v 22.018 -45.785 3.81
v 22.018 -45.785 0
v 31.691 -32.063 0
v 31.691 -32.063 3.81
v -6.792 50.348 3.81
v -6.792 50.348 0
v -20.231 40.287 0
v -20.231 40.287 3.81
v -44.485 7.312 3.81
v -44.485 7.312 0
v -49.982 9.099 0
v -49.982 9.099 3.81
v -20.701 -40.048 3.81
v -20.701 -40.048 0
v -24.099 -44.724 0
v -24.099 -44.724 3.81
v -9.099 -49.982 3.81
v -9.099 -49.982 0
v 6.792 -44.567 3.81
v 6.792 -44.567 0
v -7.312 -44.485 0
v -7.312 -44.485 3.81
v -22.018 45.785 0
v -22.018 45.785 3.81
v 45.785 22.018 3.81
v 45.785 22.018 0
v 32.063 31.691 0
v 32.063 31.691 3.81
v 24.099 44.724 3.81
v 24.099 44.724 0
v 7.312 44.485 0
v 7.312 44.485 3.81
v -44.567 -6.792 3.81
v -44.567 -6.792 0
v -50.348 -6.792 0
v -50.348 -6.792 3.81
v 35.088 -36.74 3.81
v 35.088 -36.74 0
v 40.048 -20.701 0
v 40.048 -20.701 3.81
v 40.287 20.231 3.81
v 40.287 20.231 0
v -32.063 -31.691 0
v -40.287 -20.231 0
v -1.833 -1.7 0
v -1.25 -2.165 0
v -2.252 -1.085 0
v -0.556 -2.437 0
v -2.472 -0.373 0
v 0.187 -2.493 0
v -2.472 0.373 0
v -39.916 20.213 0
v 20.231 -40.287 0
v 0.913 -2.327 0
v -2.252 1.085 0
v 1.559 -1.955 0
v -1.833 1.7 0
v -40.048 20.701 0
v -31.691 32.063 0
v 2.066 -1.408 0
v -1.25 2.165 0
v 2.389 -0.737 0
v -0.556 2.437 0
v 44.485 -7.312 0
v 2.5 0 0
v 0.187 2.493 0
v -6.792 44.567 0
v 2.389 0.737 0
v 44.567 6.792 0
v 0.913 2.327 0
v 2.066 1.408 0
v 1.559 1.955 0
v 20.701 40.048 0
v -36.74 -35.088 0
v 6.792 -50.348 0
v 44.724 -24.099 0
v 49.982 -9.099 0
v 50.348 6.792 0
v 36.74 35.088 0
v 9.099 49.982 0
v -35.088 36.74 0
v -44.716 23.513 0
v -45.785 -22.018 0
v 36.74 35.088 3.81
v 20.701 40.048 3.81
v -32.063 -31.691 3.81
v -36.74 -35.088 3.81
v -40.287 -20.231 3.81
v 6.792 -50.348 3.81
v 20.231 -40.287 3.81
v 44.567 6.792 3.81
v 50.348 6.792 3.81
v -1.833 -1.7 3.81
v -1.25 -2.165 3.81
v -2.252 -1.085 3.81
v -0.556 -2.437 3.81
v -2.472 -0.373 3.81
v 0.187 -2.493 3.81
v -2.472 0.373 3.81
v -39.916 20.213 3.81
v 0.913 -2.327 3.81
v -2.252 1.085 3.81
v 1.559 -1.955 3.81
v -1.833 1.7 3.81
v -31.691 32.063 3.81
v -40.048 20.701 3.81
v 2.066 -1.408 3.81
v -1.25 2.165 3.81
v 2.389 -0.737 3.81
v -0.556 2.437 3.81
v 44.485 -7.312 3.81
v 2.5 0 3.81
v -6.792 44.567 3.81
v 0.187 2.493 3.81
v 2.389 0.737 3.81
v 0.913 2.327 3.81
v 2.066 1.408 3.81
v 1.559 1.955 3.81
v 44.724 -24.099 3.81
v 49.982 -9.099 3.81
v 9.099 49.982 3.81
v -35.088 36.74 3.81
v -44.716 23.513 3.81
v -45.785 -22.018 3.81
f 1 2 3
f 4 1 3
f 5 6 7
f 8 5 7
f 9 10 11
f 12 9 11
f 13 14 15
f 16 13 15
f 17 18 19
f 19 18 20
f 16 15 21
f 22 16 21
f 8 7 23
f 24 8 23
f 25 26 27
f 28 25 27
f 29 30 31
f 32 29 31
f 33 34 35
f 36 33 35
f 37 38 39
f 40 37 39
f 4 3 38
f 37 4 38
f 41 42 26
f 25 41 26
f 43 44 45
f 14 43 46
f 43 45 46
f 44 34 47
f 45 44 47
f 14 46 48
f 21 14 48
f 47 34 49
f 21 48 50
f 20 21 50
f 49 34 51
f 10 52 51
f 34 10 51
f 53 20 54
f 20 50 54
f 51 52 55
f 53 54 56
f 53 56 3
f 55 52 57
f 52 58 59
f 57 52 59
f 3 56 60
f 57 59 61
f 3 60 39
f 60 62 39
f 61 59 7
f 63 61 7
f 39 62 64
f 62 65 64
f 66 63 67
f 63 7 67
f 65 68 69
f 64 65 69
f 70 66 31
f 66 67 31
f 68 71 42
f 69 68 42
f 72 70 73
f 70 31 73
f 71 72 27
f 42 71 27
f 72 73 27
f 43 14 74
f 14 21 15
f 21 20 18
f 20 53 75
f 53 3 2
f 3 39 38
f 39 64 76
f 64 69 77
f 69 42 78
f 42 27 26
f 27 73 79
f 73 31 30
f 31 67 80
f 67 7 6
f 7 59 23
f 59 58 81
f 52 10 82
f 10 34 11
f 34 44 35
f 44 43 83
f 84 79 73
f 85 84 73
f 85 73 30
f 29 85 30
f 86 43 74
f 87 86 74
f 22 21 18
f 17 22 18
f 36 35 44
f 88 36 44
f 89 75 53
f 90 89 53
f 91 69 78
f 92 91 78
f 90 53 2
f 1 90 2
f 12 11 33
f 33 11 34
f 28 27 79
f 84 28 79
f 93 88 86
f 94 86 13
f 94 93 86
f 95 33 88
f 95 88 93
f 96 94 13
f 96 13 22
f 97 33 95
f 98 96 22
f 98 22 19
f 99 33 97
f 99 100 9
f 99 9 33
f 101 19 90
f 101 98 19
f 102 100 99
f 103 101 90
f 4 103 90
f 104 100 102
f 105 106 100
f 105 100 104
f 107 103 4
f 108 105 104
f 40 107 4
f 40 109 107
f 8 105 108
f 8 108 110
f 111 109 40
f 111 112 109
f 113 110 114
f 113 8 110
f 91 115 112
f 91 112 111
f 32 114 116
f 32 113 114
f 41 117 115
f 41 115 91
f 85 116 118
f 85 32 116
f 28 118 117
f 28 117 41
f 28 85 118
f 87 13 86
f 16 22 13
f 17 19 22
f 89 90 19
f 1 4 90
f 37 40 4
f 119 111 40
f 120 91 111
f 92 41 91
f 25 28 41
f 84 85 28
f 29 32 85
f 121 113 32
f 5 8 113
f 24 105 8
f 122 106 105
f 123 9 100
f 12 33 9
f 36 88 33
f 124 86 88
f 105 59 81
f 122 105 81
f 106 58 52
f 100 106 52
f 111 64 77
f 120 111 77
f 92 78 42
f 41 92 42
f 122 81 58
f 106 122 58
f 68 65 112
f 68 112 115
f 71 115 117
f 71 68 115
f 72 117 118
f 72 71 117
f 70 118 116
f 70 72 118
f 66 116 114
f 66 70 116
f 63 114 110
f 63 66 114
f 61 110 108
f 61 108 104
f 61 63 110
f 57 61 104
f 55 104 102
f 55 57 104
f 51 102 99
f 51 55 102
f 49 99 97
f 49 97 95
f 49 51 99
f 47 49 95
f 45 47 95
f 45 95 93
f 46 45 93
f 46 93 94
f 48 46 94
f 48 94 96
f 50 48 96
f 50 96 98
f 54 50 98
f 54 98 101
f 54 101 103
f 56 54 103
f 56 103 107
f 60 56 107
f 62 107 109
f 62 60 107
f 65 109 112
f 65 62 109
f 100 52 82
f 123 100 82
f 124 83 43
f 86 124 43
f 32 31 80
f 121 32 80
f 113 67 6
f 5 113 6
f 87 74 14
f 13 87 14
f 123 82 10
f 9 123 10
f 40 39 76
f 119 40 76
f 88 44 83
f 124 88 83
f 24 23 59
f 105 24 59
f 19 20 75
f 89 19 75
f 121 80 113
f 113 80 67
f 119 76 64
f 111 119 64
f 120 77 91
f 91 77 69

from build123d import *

# Parameters (mm, degrees)
F0_R     = 8.483319
F0_R_2   = 2.5
F1_DEPTH = 3.81


with BuildPart() as f1:
    # F0 (on Top) → F1 (new body)
    with BuildSketch(Plane.XY):
        Polygon((-32.063336, -31.690658), (-36.740027, -35.088473), (-20.701093, -40.047722), (-24.098908, -44.724413), (-7.312483, -44.484637), (-9.098819, -49.982417), (6.791925, -44.567085), (6.791925, -50.347793), (20.231491, -40.286997), (22.017828, -45.784776), (31.690658, -32.063336), (35.088473, -36.740027), (40.047722, -20.701093), (44.724413, -24.098908), (44.484637, -7.312483), (49.982417, -9.098819), (44.567085, 6.791925), (50.347793, 6.791925), (40.286997, 20.231491), (45.784776, 22.017828), (32.063336, 31.690658), (36.740027, 35.088473), (20.701093, 40.047722), (24.098908, 44.724413), (7.312483, 44.484637), (9.098819, 49.982417), (-6.791925, 44.567085), (-6.791925, 50.347793), (-20.231491, 40.286997), (-22.017828, 45.784776), (-31.690658, 32.063336), (-35.088473, 36.740027), (-40.047722, 20.701093), (-39.915663, 20.212912), (-44.716039, 23.512671), (-44.484637, 7.312483), (-49.982417, 9.098819), (-44.567085, -6.791925), (-50.347793, -6.791925), (-40.286997, -20.231491), (-45.784776, -22.017828), align=None)
        Circle(F0_R, mode=Mode.SUBTRACT)
        Circle(F0_R)
        Circle(F0_R_2, mode=Mode.SUBTRACT)
    extrude(amount=F1_DEPTH)


solid = f1.part
